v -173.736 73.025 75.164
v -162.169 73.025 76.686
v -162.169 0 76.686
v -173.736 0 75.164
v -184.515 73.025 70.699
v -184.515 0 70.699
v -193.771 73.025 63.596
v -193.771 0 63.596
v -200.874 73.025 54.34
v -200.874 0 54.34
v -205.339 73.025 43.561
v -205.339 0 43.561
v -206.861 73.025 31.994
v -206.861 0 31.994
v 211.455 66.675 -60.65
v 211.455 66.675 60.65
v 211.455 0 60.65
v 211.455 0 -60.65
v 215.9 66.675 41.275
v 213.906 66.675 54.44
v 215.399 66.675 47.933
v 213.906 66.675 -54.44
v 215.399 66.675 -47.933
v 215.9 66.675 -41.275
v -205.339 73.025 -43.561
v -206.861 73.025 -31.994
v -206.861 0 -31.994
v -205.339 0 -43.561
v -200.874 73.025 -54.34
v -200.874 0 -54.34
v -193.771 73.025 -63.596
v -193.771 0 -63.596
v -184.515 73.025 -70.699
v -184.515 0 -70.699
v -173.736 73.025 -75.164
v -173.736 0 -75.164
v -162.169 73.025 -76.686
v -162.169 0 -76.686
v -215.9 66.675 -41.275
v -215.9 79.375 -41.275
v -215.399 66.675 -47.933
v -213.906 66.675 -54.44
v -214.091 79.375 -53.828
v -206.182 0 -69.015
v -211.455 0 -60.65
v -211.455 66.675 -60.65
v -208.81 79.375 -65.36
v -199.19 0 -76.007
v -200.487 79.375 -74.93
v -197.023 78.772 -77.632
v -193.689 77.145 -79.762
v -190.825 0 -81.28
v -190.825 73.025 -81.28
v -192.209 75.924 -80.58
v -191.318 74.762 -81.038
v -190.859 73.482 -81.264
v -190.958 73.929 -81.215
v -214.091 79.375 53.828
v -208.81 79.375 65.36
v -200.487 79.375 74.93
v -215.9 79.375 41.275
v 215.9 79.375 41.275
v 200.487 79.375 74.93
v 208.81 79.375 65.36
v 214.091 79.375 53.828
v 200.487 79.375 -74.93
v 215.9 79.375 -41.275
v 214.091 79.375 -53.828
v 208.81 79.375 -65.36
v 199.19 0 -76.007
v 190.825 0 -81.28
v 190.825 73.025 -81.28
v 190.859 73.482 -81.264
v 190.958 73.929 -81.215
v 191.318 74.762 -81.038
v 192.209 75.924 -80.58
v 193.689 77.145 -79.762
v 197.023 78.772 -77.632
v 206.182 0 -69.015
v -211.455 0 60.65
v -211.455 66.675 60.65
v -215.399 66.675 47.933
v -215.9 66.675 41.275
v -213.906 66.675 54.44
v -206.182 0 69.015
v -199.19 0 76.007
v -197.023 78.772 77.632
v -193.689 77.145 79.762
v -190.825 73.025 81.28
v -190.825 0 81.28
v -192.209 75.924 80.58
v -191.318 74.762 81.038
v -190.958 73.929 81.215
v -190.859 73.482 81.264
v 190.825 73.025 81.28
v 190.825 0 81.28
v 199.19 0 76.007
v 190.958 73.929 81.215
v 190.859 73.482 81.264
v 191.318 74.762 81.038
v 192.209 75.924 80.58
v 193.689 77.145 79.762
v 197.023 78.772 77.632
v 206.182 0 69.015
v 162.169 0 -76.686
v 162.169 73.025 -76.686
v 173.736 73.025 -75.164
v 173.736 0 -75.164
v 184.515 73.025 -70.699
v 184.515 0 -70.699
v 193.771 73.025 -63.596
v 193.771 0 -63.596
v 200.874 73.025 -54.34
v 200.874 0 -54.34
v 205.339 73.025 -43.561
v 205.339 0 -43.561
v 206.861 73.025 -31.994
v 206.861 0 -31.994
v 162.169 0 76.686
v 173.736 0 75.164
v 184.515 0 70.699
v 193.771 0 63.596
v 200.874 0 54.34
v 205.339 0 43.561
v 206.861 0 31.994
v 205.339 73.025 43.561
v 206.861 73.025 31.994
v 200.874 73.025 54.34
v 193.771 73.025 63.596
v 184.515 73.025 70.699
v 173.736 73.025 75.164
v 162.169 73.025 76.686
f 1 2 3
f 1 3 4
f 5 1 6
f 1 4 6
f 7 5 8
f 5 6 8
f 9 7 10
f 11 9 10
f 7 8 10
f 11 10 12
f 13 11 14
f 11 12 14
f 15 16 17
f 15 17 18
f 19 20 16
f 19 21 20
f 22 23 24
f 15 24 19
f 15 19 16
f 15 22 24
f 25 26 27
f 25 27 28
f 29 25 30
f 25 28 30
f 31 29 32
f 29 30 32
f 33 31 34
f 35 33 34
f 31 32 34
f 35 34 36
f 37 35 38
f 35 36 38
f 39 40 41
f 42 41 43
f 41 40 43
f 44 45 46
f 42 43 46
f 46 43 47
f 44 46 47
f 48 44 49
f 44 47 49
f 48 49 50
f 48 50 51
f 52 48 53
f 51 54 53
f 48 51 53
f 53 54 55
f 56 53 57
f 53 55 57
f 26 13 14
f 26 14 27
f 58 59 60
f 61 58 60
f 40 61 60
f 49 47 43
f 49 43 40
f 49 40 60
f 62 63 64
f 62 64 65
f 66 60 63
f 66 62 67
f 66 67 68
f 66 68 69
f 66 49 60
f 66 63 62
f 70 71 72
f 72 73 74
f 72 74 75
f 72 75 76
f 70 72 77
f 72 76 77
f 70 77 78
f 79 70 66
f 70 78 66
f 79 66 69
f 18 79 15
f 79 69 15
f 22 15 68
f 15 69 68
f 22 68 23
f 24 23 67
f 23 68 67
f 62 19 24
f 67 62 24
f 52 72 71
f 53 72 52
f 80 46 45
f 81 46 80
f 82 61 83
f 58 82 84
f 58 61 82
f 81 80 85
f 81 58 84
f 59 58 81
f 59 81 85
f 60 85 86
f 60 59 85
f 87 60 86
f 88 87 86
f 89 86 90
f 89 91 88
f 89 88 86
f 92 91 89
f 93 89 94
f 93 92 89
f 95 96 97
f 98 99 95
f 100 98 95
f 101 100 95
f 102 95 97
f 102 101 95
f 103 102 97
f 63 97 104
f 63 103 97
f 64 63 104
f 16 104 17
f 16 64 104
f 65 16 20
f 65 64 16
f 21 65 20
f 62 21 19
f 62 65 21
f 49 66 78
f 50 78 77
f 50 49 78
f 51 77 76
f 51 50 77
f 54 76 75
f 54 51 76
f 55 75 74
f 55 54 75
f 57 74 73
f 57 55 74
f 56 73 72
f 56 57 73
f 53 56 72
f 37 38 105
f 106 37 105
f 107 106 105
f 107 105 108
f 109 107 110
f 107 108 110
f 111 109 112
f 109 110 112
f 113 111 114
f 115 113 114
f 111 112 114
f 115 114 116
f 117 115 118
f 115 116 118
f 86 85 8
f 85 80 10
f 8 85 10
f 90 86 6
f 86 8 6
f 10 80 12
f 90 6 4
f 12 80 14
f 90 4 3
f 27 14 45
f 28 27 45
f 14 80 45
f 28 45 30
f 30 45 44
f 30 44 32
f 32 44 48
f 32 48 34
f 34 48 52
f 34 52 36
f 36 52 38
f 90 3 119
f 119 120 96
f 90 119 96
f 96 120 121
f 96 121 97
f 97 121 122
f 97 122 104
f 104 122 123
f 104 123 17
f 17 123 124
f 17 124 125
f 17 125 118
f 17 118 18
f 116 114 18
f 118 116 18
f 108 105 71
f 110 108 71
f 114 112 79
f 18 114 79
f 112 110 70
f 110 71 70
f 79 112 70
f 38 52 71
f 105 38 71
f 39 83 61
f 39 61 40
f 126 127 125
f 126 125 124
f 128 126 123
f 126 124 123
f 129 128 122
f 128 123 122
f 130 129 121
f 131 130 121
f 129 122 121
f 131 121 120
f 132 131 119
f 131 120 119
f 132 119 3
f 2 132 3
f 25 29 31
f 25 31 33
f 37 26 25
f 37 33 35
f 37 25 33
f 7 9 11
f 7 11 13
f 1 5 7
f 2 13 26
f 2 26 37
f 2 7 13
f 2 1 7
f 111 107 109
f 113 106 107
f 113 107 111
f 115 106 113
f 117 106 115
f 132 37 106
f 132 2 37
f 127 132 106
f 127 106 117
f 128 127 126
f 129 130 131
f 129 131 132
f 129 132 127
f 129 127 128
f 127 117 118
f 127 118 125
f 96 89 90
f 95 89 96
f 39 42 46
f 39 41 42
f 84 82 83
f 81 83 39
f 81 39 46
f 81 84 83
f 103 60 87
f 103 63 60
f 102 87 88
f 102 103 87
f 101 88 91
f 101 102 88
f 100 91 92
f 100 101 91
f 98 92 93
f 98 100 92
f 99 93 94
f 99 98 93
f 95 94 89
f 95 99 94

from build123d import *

# Parameters (mm, degrees)
SKETCH1_W               = 431.8
SKETCH1_H               = 171.45
BOSS_EXTRUDE1_DEPTH     = 85.725
CUT_EXTRUDE1_DEPTH      = 73.025
FILLET3_R               = 44.45
F_0_25_OFF_TOP_DEPTH    = 6.35
SKETCH4_W               = 431.8
SKETCH4_H               = 79.375
CUT_EXTRUDE_0_125_DEPTH = 4.445
SKETCH5_W               = 167.005
SKETCH5_H               = 66.675
F_1_8_IN_DEPTH          = 4.445
SKETCH6_W               = 427.355
SKETCH6_H               = 79.375
CUT_EXTRUDE5_DEPTH      = 4.445
SKETCH7_W               = 162.0012
SKETCH7_H               = 66.675
CUT_EXTRUDE6_DEPTH      = 4.445
FILLET5_R               = 6.35


with BuildPart() as part:
    # Sketch1 → Boss-Extrude1 (new body)
    with BuildSketch(Plane(origin=(0, 0, 0), x_dir=(1, 0, 0), z_dir=(0, 1, 0))):
        Rectangle(SKETCH1_W, SKETCH1_H)
    extrude(amount=BOSS_EXTRUDE1_DEPTH)

    # Sketch2 → Cut-Extrude1 (cut)
    with BuildSketch(Plane.XZ):
        with BuildLine():
            Line((162.16885638, 76.686434381), (-162.16885638, 76.686434381))
            ThreePointArc((-162.16885638, 76.686434381), (-193.771281353, 63.596281353), (-206.861434381, 31.99385638))
            Line((-206.861434381, 31.99385638), (-206.861434381, -31.99385638))
            ThreePointArc((-206.861434381, -31.99385638), (-193.771281353, -63.596281353), (-162.16885638, -76.686434381))
            Line((-162.16885638, -76.686434381), (162.16885638, -76.686434381))
            ThreePointArc((162.16885638, -76.686434381), (193.771281353, -63.596281353), (206.861434381, -31.99385638))
            Line((206.861434381, -31.99385638), (206.861434381, 31.99385638))
            ThreePointArc((206.861434381, 31.99385638), (193.771281353, 63.596281353), (162.16885638, 76.686434381))
        make_face()
    extrude(amount=-CUT_EXTRUDE1_DEPTH, mode=Mode.SUBTRACT)

    # Fillet3
    fillet3_edges = [part.edges().sort_by_distance(p)[0] for p in [
        (215.9, 42.8625, 85.725),
        (-215.9, 42.8625, 85.725),
        (-215.9, 42.8625, -85.725),
        (215.9, 42.8625, -85.725),
    ]]
    fillet(fillet3_edges, radius=FILLET3_R)

    # Sketch3 → 0.25 off top (cut)
    with BuildSketch(Plane(origin=(0, 85.725, 0), x_dir=(1, 0, 0), z_dir=(0, 1, 0))):
        with BuildLine():
            Line((215.9, -41.275), (215.9, 41.275))
            ThreePointArc((215.9, 41.275), (202.880896424, 72.705896424), (171.45, 85.725))
            Line((171.45, 85.725), (-171.45, 85.725))
            ThreePointArc((-171.45, 85.725), (-202.880896424, 72.705896424), (-215.9, 41.275))
            Line((-215.9, 41.275), (-215.9, -41.275))
            ThreePointArc((-215.9, -41.275), (-202.880896424, -72.705896424), (-171.45, -85.725))
            Line((-171.45, -85.725), (171.45, -85.725))
            ThreePointArc((171.45, -85.725), (202.880896424, -72.705896424), (215.9, -41.275))
        make_face()
    extrude(amount=-F_0_25_OFF_TOP_DEPTH, mode=Mode.SUBTRACT)

    # Sketch4 → 0.125 (cut)
    with BuildSketch(Plane.XY.offset(85.725)):
        with Locations((0, 39.6875)):
            Rectangle(SKETCH4_W, SKETCH4_H)
    extrude(amount=-CUT_EXTRUDE_0_125_DEPTH, mode=Mode.SUBTRACT)

    # Sketch5 → 1/8 in (cut)
    with BuildSketch(Plane.ZY.offset(215.9)):
        with Locations((-2.2225, 33.3375)):
            Rectangle(SKETCH5_W, SKETCH5_H)
    extrude(amount=-F_1_8_IN_DEPTH, mode=Mode.SUBTRACT)

    # Sketch6 → Cut-Extrude5 (cut)
    with BuildSketch(Plane(origin=(0, 0, -85.725), x_dir=(-1, 0, 0), z_dir=(0, 0, -1))):
        with Locations((-2.2225, 39.6875)):
            Rectangle(SKETCH6_W, SKETCH6_H)
    extrude(amount=-CUT_EXTRUDE5_DEPTH, mode=Mode.SUBTRACT)

    # Sketch7 → Cut-Extrude6 (cut)
    with BuildSketch(Plane(origin=(215.9, 0, 0), x_dir=(0, 0, -1), z_dir=(1, 0, 0))):
        with Locations((0.2794, 33.3375)):
            Rectangle(SKETCH7_W, SKETCH7_H)
    extrude(amount=-CUT_EXTRUDE6_DEPTH, mode=Mode.SUBTRACT)

    # Fillet5
    fillet5_edges = [part.edges().sort_by_distance(p)[0] for p in [
        (0, 79.375, -81.28),
        (0, 79.375, 81.28),
    ]]
    fillet(fillet5_edges, radius=FILLET5_R)


solid = part.part
